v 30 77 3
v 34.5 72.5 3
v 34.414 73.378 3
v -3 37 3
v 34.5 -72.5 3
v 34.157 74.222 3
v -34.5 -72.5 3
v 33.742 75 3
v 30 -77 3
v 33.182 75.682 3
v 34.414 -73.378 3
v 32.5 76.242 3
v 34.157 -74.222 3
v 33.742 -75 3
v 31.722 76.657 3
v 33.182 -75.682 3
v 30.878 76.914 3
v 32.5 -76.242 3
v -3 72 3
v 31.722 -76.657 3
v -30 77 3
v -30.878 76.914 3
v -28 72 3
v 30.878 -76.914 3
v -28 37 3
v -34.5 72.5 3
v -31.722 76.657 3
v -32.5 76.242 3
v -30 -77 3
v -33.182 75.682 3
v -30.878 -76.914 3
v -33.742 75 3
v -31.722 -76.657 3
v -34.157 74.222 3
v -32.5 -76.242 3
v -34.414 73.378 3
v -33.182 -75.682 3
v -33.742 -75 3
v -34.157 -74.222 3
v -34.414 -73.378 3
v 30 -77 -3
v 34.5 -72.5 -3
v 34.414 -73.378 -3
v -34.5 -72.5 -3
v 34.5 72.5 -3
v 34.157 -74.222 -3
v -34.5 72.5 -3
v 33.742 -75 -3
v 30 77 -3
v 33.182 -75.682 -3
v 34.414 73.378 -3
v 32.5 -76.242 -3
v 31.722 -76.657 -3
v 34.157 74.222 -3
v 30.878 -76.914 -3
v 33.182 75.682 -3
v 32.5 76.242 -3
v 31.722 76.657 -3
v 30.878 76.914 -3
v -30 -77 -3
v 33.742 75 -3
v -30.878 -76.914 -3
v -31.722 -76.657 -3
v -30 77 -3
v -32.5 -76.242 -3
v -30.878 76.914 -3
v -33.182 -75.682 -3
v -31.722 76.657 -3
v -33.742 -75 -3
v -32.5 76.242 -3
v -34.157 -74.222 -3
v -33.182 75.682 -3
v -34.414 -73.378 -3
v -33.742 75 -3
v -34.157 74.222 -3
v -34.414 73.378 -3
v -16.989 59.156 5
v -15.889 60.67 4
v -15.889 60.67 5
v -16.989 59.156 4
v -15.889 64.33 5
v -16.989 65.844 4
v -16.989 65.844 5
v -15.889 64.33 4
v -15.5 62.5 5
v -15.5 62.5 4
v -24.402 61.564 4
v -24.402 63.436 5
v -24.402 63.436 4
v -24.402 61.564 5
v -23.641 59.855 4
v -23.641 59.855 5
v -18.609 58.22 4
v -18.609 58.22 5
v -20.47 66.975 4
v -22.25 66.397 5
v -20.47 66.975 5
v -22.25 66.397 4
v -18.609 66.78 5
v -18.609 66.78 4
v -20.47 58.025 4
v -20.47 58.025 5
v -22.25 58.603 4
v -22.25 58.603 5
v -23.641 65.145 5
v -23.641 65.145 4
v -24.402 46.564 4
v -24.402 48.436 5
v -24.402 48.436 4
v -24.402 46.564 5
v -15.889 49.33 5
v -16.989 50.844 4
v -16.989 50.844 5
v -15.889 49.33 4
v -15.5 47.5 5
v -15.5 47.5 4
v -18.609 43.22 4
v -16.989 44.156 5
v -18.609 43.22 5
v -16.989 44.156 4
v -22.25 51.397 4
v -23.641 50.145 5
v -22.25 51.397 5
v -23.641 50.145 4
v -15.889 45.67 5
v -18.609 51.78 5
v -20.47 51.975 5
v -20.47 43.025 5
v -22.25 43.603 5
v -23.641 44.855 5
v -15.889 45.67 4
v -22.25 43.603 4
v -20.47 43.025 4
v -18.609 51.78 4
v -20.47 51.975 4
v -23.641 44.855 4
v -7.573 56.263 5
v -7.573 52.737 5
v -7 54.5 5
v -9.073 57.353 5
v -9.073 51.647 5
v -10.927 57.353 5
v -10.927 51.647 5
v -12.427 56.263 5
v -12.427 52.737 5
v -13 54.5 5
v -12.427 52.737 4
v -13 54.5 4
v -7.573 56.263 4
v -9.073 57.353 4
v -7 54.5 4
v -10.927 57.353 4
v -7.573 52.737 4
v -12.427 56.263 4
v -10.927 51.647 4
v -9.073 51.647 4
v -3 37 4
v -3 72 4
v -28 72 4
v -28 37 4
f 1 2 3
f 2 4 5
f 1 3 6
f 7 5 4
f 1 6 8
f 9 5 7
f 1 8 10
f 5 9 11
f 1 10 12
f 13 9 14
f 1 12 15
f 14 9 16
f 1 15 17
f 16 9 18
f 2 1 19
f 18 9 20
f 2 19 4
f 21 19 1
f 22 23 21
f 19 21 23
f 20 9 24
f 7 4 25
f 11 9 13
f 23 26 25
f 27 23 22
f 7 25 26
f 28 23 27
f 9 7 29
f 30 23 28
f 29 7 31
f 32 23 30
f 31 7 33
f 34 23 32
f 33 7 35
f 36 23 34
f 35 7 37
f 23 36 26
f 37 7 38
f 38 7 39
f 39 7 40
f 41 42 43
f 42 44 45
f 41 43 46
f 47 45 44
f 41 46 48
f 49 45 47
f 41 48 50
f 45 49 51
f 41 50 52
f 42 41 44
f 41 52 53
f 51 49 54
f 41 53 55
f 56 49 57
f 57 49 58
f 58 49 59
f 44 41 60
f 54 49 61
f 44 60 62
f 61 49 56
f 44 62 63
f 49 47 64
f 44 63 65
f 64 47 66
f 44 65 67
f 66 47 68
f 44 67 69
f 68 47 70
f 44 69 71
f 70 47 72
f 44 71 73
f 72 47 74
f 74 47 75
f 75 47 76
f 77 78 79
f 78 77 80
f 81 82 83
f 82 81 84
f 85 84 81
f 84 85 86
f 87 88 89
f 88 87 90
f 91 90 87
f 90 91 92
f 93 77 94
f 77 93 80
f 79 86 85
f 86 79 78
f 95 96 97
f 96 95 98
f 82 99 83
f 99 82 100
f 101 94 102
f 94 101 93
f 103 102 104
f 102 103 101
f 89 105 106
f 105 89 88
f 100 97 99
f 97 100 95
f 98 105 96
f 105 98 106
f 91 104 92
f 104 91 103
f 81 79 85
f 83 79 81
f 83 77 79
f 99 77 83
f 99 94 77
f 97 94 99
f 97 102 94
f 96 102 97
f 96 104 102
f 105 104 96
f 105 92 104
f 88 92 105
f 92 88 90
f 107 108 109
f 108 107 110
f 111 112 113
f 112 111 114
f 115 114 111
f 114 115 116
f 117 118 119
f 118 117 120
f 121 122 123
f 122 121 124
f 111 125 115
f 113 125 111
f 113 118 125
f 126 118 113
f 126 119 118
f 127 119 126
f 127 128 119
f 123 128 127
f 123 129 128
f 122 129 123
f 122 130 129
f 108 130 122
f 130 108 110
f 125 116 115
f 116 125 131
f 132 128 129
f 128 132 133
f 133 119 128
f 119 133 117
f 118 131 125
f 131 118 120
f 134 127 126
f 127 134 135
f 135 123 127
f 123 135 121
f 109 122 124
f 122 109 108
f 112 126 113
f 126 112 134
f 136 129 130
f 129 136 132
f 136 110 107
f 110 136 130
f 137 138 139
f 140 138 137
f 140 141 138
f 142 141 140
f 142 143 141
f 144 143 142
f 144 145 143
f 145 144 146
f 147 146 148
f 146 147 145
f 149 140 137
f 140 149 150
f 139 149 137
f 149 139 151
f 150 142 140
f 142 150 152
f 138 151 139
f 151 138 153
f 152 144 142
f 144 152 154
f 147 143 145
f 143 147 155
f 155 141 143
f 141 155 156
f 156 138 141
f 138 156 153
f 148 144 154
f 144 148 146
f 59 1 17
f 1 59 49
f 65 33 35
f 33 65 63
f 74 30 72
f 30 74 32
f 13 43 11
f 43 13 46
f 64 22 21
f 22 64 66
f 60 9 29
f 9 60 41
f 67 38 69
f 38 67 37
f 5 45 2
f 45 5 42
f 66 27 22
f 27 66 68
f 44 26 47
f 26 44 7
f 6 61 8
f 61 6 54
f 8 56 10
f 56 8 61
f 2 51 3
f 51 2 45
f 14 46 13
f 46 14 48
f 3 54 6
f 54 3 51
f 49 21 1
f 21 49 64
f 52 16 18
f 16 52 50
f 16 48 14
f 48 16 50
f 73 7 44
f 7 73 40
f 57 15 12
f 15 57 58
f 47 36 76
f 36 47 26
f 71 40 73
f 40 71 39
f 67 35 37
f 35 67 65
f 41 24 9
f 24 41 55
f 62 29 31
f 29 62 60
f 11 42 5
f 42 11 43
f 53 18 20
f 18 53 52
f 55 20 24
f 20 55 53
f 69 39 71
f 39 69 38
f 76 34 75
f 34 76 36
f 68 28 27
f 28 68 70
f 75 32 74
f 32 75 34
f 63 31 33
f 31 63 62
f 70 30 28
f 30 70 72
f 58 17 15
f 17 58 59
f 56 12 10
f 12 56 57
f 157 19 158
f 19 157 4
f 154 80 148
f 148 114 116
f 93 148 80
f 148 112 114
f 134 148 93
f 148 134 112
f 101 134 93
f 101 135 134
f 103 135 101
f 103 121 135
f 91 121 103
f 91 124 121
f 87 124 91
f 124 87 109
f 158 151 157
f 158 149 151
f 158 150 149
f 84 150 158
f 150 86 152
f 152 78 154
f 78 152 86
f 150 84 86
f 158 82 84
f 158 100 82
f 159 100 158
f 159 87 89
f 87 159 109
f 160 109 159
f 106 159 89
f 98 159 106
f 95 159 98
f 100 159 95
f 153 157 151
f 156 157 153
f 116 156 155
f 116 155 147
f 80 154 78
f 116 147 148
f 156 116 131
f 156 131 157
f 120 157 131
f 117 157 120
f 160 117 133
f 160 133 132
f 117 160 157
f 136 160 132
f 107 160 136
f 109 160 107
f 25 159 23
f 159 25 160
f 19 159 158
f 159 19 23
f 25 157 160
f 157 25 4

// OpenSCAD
echo("Работа Павла Юнкер");
len_phone = 145;
width_phone = 60;
thickness_phone = 6;

corner_round = 9;

module camera() {
    cube([width_phone, len_phone, thickness_phone], center=true);

    color("blue")
    translate([width_phone/2-50, len_phone/2-10, 0])
    cylinder(d=9, h = thickness_phone - 1);

    color("blue")
    translate([width_phone/2-50, len_phone/2-25, 0])
    cylinder(d=9, h = thickness_phone - 1);

    color("blue")
    translate([width_phone/2-40, len_phone/2-18, 0])
    cylinder(d=6, h = thickness_phone - 1);
}

module smartphone_block() {
    hull() {
        color("red")
        translate([width_phone/2, len_phone/2, 0])
        cylinder(h=thickness_phone, d=corner_round, $fn=32, center=true);

        mirror([1,0,0])
        color("red")
        translate([width_phone/2, len_phone/2, 0])
        cylinder(h=thickness_phone, d=corner_round, $fn=32, center=true);

        mirror([0,1,0])
        color("red")
        translate([width_phone/2, len_phone/2, 0])
        cylinder(h=thickness_phone, d=corner_round, $fn=32, center=true);

        mirror([1,0,0])
        mirror([0,1,0])
        color("red")
        translate([width_phone/2, len_phone/2, 0])
        cylinder(h=thickness_phone, d=corner_round, $fn=32, center=true);
    }
}

h = 3;

module smartphone() {
    smartphone_block();
    camera();
    color("red")
    translate([-28, 37, 2])
    cube([25, 35, 2]);
}

smartphone();
